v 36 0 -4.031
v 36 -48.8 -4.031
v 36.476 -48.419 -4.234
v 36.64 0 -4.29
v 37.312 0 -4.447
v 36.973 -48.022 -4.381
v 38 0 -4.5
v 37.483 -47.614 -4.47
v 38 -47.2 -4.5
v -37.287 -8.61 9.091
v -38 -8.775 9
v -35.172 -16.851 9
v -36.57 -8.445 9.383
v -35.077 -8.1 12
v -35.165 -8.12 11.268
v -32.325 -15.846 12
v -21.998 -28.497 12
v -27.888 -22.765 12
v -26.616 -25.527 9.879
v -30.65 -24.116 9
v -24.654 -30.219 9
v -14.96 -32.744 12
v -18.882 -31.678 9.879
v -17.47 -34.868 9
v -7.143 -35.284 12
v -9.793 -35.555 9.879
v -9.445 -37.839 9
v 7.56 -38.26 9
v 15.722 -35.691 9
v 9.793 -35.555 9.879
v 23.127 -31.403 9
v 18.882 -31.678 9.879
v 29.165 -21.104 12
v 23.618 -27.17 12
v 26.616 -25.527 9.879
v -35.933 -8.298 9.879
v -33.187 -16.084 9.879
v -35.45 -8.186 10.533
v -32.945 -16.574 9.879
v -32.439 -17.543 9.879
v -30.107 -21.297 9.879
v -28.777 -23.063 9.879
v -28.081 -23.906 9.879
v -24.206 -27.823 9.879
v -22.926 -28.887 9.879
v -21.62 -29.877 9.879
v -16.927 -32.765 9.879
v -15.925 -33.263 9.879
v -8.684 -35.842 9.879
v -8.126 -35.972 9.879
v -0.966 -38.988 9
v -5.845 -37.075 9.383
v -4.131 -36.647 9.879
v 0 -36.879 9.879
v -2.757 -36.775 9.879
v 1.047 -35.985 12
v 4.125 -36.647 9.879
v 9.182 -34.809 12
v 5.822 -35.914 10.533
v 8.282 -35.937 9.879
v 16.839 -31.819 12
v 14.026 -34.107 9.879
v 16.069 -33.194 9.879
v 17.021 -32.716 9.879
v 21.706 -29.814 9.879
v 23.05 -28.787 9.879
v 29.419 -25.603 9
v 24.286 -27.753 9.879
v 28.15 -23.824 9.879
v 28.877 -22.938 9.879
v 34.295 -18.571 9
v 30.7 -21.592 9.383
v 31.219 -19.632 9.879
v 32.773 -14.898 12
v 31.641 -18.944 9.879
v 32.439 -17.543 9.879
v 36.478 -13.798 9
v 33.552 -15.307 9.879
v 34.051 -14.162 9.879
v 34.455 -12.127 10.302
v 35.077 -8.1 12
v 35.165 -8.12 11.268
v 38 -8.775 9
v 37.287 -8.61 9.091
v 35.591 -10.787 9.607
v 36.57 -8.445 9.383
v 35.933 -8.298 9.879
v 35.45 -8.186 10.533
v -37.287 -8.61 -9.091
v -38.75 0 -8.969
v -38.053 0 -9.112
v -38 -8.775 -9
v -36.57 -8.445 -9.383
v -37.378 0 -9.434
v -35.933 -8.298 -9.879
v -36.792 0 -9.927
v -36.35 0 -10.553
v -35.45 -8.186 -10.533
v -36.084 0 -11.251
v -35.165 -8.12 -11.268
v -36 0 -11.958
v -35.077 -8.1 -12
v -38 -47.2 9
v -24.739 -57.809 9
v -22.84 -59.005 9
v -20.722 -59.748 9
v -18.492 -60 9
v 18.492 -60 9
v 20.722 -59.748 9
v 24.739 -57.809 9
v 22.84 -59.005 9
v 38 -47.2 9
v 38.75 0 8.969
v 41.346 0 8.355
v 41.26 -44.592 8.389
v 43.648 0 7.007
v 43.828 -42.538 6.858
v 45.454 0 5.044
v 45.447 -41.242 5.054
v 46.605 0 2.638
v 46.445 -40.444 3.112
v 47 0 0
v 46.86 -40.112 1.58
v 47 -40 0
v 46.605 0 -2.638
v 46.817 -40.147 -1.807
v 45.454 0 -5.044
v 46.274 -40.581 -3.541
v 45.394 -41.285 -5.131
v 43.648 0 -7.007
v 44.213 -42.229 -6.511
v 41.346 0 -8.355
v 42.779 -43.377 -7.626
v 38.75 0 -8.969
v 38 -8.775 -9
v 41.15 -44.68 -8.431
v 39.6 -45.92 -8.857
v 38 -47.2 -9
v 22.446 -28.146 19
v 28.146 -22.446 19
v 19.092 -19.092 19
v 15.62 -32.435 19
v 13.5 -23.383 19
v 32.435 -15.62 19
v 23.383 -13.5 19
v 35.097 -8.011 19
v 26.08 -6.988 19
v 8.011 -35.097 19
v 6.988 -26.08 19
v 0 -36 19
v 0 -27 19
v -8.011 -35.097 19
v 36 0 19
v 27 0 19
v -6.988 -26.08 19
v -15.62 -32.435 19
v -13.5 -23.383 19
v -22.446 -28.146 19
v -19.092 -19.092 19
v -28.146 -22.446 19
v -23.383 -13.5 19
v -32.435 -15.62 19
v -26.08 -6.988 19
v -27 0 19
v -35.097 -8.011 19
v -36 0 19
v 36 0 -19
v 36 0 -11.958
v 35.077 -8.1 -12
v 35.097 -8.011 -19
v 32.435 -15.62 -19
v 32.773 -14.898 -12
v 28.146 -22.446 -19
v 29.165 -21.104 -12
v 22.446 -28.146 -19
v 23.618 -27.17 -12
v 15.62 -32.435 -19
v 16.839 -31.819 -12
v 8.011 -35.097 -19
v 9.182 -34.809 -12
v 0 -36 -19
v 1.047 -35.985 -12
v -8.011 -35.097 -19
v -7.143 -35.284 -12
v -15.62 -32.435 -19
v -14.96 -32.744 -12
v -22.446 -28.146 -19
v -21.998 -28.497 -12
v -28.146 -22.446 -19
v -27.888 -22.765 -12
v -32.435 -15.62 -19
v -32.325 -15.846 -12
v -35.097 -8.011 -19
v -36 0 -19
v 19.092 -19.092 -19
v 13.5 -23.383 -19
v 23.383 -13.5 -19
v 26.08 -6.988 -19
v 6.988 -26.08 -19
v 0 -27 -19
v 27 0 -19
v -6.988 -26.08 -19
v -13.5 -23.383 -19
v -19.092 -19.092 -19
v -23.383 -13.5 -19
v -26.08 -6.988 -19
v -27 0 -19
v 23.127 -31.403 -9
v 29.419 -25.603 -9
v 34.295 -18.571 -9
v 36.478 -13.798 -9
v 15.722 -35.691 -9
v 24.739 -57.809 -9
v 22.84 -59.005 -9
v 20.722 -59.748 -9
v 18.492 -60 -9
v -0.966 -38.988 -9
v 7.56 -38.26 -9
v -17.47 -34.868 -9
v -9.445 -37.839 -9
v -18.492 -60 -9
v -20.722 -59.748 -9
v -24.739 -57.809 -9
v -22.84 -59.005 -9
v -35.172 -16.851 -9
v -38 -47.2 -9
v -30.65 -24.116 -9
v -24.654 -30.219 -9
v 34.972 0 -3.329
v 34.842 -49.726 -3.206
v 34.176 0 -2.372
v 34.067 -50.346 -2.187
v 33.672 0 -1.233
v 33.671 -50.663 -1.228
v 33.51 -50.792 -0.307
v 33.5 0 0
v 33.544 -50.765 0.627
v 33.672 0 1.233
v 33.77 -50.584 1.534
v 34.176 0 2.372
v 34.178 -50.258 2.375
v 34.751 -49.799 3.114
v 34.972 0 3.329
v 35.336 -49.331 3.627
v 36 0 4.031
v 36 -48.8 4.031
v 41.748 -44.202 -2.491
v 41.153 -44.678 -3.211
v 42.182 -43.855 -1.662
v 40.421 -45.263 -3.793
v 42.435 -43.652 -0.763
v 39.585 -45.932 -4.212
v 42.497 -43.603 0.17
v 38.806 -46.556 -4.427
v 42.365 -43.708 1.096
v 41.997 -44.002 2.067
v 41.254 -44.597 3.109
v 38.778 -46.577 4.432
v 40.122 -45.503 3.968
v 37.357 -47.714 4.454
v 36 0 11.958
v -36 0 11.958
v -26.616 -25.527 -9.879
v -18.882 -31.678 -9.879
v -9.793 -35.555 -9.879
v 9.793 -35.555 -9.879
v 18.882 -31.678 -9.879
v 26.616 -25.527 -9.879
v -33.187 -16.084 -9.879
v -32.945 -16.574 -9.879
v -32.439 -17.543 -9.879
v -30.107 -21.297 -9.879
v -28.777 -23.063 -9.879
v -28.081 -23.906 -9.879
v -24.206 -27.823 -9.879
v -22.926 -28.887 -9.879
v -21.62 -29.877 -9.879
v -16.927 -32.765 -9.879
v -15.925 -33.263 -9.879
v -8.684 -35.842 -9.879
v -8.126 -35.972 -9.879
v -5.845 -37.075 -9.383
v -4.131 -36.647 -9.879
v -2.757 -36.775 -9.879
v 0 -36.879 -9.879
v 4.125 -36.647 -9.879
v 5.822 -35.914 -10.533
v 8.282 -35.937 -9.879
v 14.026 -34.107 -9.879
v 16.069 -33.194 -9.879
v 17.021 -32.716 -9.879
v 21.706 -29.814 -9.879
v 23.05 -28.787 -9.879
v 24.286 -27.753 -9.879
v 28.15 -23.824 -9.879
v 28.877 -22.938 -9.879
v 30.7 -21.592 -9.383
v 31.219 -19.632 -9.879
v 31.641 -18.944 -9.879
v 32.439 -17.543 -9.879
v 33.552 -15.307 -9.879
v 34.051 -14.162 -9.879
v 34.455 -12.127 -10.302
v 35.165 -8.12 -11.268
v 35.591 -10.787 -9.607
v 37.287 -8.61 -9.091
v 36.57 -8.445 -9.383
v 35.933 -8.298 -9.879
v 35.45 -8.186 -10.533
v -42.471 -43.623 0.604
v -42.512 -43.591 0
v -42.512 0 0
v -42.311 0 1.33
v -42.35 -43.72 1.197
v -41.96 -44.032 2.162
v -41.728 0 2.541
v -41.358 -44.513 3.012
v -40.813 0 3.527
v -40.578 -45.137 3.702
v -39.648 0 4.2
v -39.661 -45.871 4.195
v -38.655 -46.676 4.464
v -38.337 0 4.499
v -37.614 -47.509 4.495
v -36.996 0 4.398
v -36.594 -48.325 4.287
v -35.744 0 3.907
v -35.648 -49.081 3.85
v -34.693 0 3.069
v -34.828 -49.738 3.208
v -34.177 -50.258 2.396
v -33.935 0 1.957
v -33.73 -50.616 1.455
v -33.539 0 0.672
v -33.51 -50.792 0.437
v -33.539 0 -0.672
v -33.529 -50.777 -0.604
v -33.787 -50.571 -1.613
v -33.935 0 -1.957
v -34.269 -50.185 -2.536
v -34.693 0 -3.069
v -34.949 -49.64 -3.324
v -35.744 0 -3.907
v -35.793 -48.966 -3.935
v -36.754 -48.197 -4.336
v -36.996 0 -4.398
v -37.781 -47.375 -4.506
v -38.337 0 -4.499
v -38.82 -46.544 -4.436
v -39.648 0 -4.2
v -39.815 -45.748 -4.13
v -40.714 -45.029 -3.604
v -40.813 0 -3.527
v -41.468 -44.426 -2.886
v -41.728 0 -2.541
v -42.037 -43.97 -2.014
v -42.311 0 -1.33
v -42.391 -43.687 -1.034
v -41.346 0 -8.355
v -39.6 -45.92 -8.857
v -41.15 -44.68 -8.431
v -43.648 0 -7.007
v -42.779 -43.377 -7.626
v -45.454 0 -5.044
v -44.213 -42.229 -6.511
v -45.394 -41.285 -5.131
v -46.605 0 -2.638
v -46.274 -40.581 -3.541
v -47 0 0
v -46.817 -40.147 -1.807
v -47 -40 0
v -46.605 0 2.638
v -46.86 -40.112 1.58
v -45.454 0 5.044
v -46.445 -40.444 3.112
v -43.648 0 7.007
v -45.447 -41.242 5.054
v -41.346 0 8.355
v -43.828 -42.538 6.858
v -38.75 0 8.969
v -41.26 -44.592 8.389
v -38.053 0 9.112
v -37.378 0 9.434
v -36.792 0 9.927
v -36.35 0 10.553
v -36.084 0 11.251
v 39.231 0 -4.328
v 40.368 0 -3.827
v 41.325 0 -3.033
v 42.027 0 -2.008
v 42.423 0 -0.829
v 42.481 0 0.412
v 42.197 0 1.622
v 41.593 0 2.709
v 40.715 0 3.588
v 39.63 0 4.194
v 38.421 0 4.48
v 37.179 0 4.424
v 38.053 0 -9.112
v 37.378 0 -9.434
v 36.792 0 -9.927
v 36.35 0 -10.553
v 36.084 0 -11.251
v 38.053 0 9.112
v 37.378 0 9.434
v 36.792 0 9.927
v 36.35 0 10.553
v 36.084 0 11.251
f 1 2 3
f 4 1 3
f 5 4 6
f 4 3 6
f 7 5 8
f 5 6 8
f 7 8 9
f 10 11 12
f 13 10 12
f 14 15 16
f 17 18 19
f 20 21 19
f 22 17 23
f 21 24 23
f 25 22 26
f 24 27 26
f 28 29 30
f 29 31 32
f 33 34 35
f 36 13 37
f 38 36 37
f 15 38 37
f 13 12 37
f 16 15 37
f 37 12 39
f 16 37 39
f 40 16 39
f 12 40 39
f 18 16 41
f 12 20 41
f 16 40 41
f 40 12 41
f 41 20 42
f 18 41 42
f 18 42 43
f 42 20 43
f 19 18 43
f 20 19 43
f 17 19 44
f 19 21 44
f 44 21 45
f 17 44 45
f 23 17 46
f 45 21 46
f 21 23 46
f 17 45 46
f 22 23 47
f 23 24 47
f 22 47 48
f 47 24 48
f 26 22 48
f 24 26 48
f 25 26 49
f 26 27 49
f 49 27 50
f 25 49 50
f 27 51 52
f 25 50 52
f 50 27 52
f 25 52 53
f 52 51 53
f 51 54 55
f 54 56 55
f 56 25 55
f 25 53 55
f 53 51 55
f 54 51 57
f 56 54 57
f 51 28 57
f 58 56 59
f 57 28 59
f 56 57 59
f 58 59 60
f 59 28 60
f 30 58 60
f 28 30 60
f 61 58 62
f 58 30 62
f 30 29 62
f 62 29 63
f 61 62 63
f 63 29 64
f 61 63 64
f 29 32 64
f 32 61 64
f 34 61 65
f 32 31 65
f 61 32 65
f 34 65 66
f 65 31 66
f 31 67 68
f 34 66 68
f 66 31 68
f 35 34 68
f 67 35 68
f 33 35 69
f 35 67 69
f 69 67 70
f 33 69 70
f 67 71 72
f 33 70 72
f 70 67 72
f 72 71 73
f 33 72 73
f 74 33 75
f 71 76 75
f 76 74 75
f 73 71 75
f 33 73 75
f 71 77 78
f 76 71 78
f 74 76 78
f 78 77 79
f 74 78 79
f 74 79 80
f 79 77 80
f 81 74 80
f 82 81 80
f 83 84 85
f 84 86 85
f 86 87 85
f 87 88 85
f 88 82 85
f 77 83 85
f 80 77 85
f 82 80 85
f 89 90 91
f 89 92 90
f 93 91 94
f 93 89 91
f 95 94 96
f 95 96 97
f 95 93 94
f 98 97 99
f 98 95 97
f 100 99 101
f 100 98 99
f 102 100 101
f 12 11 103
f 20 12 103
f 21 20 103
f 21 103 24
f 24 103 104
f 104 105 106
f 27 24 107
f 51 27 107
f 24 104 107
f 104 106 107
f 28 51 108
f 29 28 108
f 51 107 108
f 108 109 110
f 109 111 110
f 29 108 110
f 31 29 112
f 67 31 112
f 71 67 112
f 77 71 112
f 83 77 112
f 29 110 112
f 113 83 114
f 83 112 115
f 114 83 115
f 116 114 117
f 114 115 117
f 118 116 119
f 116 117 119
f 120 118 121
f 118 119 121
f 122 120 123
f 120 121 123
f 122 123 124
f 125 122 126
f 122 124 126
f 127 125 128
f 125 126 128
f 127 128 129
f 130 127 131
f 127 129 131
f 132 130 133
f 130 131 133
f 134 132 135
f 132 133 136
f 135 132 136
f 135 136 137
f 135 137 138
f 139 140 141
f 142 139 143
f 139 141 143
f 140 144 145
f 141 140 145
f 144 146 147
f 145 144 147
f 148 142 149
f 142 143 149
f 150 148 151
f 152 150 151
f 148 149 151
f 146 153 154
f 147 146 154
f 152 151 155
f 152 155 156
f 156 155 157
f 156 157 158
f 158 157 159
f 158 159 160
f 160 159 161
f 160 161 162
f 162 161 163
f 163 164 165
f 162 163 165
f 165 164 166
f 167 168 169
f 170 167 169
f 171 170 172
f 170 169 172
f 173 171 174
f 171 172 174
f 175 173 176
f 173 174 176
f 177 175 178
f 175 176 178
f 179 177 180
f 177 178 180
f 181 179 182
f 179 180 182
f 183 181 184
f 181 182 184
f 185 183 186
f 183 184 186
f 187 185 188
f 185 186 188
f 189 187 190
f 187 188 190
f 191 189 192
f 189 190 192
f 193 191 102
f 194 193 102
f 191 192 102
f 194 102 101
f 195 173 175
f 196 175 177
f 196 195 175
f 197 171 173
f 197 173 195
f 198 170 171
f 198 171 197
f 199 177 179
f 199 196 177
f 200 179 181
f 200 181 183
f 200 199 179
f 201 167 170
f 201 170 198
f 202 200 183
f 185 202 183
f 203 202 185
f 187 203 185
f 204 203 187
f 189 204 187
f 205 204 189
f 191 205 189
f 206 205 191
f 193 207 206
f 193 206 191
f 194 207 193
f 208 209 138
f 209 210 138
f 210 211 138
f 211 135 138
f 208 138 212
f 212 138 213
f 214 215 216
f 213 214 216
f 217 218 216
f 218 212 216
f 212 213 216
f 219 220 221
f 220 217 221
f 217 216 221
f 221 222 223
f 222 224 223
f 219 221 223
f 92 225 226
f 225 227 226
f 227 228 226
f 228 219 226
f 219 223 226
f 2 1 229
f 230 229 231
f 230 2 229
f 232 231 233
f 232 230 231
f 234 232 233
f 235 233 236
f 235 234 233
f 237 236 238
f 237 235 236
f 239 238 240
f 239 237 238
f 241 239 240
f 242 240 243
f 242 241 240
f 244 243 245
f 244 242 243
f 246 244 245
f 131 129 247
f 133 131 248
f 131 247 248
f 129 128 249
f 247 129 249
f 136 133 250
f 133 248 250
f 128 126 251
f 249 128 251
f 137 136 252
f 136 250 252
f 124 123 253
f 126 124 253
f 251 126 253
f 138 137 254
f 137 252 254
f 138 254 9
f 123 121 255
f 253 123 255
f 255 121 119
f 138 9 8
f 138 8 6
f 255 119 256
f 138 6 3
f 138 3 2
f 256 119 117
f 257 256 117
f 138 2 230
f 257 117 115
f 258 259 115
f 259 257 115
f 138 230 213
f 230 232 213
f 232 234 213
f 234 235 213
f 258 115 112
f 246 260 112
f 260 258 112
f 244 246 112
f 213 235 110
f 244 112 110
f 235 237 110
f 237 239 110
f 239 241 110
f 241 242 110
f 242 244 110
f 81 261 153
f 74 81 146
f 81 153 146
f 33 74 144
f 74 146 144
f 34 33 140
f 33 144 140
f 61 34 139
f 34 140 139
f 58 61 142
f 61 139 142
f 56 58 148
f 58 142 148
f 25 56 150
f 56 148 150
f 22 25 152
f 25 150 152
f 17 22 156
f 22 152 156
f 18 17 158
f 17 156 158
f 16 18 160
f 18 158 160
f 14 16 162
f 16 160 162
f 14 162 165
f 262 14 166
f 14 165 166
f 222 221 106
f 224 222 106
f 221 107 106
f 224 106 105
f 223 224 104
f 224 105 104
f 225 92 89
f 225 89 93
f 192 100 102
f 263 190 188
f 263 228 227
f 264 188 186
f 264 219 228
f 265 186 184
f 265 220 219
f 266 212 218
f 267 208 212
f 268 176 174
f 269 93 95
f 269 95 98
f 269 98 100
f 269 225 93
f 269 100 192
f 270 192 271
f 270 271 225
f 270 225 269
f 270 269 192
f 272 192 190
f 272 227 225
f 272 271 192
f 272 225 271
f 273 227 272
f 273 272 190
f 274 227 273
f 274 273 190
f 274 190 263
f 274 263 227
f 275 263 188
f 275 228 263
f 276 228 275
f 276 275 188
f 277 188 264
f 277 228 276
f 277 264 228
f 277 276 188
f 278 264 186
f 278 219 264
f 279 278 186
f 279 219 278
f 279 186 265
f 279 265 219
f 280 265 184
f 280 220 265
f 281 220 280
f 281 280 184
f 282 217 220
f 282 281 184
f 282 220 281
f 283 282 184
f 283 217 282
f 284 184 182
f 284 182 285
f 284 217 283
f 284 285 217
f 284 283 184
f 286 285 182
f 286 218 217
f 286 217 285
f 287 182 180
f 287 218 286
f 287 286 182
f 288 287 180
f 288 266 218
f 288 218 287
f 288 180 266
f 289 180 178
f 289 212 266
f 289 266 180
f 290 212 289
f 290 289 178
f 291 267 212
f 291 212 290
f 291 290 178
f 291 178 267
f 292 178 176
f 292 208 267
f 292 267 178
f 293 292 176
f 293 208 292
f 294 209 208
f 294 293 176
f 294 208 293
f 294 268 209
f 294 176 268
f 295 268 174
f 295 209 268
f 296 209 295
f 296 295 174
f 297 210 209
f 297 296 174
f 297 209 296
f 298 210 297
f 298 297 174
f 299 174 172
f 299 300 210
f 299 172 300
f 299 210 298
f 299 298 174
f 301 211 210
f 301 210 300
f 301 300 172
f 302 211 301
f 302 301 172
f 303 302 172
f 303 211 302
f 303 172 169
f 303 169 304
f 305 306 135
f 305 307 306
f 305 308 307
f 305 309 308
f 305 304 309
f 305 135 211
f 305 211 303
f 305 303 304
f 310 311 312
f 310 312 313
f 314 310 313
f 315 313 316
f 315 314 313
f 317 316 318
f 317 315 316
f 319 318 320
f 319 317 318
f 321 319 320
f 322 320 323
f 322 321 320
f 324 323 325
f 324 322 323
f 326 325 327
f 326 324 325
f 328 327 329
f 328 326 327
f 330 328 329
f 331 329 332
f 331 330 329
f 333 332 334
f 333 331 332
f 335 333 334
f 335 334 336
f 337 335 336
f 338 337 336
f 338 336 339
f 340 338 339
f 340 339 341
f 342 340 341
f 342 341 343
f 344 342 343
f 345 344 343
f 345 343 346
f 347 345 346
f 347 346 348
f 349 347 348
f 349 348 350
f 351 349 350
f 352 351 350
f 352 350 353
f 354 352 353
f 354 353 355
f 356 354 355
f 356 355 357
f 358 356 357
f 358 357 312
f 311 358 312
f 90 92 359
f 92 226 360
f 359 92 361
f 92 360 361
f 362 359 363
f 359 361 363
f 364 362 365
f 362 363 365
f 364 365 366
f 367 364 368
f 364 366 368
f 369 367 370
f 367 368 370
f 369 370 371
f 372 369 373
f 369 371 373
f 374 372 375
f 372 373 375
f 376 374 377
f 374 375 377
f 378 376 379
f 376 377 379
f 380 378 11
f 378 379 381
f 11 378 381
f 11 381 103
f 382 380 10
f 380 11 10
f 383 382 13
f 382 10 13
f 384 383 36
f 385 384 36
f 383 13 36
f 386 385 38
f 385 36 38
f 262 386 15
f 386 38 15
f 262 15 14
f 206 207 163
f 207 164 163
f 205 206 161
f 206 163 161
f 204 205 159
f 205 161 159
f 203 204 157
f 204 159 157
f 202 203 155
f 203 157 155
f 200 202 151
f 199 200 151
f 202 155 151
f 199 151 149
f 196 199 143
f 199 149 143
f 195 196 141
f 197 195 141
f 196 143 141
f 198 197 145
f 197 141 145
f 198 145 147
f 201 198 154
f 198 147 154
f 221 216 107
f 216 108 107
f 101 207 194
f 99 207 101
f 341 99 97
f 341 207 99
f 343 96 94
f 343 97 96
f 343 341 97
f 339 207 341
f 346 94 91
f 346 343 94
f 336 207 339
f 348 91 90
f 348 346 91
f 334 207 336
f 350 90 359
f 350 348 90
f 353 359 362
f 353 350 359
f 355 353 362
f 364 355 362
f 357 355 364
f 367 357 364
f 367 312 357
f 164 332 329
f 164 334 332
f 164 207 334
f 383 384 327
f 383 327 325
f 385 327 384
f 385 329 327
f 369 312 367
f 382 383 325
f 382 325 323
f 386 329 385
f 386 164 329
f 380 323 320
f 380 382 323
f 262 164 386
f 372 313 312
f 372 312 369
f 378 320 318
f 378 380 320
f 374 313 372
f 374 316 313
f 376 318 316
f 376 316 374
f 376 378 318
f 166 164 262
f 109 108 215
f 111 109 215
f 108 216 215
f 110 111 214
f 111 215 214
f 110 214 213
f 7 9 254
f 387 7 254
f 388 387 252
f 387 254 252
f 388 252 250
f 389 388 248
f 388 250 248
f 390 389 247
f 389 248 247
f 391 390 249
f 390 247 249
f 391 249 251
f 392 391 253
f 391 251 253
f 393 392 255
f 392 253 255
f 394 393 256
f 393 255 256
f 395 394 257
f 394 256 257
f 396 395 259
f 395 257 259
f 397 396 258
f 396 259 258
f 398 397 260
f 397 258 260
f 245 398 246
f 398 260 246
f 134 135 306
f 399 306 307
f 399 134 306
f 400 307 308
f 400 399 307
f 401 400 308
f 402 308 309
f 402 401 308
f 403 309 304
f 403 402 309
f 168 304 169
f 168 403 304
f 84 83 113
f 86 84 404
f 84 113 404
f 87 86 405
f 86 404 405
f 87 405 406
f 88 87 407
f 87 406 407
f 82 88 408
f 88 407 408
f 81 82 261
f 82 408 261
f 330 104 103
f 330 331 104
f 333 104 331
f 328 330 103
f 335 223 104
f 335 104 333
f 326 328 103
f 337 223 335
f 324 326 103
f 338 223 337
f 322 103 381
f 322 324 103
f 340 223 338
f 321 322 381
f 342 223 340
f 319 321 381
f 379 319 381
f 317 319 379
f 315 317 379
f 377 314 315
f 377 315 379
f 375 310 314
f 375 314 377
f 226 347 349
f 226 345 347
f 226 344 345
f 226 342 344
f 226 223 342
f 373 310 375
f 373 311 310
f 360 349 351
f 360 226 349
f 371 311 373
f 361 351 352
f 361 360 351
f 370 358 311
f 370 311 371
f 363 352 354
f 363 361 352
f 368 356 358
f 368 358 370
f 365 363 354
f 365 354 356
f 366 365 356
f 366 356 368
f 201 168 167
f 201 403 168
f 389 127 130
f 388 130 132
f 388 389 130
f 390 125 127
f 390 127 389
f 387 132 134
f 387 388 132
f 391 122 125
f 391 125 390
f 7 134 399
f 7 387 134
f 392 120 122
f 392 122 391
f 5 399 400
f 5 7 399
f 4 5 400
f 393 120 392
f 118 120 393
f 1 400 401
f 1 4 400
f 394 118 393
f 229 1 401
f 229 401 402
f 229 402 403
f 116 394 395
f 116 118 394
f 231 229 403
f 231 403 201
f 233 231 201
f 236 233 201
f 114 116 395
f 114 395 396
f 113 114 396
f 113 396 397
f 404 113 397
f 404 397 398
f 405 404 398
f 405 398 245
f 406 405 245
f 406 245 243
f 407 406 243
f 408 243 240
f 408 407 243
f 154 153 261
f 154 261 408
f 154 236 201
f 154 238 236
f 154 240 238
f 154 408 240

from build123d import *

# Parameters (mm, degrees)
BOSS_EXTRUDE1_DEPTH = 19
BOSS_EXTRUDE2_DEPTH = 9
SKETCH2_R           = 4.5
BOSS_EXTRUDE3_DEPTH = 60
CUT_EXTRUDE1_START  = -18
CUT_EXTRUDE1_DEPTH  = 18
CUT_EXTRUDE2_START  = -68
SKETCH4_R           = 4.511504631
SKETCH4_R_2         = 4.5
CUT_EXTRUDE2_DEPTH  = 68
CUT_EXTRUDE3_DEPTH  = 34
FILLET1_R           = 10
FILLET2_R           = 3


with BuildPart() as part:
    # Sketch1 → Boss-Extrude1 (new, symmetric)
    with BuildSketch(Plane.XY):
        with BuildLine():
            Line((-36, 0), (-27, 0))
            ThreePointArc((-27, 0), (0, -27), (27, 0))
            Line((27, 0), (36, 0))
            ThreePointArc((36, 0), (0, -36), (-36, 0))
        make_face()
    extrude(amount=BOSS_EXTRUDE1_DEPTH, both=True)

    # Sketch1<3> → Boss-Extrude2 (add, symmetric)
    with BuildSketch(Plane.XY):
        with BuildLine():
            ThreePointArc((-36, 0), (0, -36), (36, 0))
            Line((36, 0), (36, -60))
            Line((36, -60), (-36, -60))
            Line((-36, -60), (-36, 0))
        make_face()
    extrude(amount=BOSS_EXTRUDE2_DEPTH, both=True)

    # Sketch2 → Boss-Extrude3 (add)
    with BuildSketch(Plane.XZ.offset(60)):
        with BuildLine():
            Line((-38, 9), (38, 9))
            ThreePointArc((38, 9), (47, 0), (38, -9))
            Line((38, -9), (-38, -9))
            ThreePointArc((-38, -9), (-47, 0), (-38, 9))
        make_face()
        with Locations((-38, 0)):
            Circle(SKETCH2_R, mode=Mode.SUBTRACT)
        with Locations((38, 0)):
            Circle(SKETCH2_R, mode=Mode.SUBTRACT)
    extrude(amount=-BOSS_EXTRUDE3_DEPTH)

    # Sketch3 → Cut-Extrude1 (cut)
    with BuildSketch(Plane(origin=(0, 0, -9), x_dir=(-1, 0, 0), z_dir=(0, 0, -1)).offset(CUT_EXTRUDE1_START)):
        with BuildLine():
            Line((27, 0), (-27, 0))
            ThreePointArc((-27, 0), (0, -27), (27, 0))
        make_face()
    extrude(amount=CUT_EXTRUDE1_DEPTH, mode=Mode.SUBTRACT)

    # Sketch4 → Cut-Extrude2 (cut)
    with BuildSketch(Plane(origin=(0, 0, 0), x_dir=(1, 0, 0), z_dir=(0, 1, 0)).offset(CUT_EXTRUDE2_START)):
        with Locations(Location((-38, 0, 0), (0, 0, 180))):
            Circle(SKETCH4_R)
        with Locations(Location((38, 0, 0), (0, 0, 90))):
            Circle(SKETCH4_R_2)
    extrude(amount=CUT_EXTRUDE2_DEPTH, mode=Mode.SUBTRACT)

    # Sketch5 → Cut-Extrude3 (cut, symmetric)
    with BuildSketch(Plane.XY):
        Polygon((-47, -60), (-22, -60), (-47, -40), align=None)
        Polygon((47, -60), (47, -40), (22, -60), align=None)
    extrude(amount=CUT_EXTRUDE3_DEPTH, both=True, mode=Mode.SUBTRACT)

    # Fillet1
    fillet1_edges = [part.edges().sort_by_distance(p)[0] for p in [
        (-22, -60, 0),
        (22, -60, 0),
    ]]
    fillet(fillet1_edges, radius=FILLET1_R)

    # Fillet2
    fillet2_edges = [part.edges().sort_by_distance(p)[0] for p in [
        (0, -36, 9),
        (0, -36, -9),
    ]]
    fillet(fillet2_edges, radius=FILLET2_R)


solid = part.part
